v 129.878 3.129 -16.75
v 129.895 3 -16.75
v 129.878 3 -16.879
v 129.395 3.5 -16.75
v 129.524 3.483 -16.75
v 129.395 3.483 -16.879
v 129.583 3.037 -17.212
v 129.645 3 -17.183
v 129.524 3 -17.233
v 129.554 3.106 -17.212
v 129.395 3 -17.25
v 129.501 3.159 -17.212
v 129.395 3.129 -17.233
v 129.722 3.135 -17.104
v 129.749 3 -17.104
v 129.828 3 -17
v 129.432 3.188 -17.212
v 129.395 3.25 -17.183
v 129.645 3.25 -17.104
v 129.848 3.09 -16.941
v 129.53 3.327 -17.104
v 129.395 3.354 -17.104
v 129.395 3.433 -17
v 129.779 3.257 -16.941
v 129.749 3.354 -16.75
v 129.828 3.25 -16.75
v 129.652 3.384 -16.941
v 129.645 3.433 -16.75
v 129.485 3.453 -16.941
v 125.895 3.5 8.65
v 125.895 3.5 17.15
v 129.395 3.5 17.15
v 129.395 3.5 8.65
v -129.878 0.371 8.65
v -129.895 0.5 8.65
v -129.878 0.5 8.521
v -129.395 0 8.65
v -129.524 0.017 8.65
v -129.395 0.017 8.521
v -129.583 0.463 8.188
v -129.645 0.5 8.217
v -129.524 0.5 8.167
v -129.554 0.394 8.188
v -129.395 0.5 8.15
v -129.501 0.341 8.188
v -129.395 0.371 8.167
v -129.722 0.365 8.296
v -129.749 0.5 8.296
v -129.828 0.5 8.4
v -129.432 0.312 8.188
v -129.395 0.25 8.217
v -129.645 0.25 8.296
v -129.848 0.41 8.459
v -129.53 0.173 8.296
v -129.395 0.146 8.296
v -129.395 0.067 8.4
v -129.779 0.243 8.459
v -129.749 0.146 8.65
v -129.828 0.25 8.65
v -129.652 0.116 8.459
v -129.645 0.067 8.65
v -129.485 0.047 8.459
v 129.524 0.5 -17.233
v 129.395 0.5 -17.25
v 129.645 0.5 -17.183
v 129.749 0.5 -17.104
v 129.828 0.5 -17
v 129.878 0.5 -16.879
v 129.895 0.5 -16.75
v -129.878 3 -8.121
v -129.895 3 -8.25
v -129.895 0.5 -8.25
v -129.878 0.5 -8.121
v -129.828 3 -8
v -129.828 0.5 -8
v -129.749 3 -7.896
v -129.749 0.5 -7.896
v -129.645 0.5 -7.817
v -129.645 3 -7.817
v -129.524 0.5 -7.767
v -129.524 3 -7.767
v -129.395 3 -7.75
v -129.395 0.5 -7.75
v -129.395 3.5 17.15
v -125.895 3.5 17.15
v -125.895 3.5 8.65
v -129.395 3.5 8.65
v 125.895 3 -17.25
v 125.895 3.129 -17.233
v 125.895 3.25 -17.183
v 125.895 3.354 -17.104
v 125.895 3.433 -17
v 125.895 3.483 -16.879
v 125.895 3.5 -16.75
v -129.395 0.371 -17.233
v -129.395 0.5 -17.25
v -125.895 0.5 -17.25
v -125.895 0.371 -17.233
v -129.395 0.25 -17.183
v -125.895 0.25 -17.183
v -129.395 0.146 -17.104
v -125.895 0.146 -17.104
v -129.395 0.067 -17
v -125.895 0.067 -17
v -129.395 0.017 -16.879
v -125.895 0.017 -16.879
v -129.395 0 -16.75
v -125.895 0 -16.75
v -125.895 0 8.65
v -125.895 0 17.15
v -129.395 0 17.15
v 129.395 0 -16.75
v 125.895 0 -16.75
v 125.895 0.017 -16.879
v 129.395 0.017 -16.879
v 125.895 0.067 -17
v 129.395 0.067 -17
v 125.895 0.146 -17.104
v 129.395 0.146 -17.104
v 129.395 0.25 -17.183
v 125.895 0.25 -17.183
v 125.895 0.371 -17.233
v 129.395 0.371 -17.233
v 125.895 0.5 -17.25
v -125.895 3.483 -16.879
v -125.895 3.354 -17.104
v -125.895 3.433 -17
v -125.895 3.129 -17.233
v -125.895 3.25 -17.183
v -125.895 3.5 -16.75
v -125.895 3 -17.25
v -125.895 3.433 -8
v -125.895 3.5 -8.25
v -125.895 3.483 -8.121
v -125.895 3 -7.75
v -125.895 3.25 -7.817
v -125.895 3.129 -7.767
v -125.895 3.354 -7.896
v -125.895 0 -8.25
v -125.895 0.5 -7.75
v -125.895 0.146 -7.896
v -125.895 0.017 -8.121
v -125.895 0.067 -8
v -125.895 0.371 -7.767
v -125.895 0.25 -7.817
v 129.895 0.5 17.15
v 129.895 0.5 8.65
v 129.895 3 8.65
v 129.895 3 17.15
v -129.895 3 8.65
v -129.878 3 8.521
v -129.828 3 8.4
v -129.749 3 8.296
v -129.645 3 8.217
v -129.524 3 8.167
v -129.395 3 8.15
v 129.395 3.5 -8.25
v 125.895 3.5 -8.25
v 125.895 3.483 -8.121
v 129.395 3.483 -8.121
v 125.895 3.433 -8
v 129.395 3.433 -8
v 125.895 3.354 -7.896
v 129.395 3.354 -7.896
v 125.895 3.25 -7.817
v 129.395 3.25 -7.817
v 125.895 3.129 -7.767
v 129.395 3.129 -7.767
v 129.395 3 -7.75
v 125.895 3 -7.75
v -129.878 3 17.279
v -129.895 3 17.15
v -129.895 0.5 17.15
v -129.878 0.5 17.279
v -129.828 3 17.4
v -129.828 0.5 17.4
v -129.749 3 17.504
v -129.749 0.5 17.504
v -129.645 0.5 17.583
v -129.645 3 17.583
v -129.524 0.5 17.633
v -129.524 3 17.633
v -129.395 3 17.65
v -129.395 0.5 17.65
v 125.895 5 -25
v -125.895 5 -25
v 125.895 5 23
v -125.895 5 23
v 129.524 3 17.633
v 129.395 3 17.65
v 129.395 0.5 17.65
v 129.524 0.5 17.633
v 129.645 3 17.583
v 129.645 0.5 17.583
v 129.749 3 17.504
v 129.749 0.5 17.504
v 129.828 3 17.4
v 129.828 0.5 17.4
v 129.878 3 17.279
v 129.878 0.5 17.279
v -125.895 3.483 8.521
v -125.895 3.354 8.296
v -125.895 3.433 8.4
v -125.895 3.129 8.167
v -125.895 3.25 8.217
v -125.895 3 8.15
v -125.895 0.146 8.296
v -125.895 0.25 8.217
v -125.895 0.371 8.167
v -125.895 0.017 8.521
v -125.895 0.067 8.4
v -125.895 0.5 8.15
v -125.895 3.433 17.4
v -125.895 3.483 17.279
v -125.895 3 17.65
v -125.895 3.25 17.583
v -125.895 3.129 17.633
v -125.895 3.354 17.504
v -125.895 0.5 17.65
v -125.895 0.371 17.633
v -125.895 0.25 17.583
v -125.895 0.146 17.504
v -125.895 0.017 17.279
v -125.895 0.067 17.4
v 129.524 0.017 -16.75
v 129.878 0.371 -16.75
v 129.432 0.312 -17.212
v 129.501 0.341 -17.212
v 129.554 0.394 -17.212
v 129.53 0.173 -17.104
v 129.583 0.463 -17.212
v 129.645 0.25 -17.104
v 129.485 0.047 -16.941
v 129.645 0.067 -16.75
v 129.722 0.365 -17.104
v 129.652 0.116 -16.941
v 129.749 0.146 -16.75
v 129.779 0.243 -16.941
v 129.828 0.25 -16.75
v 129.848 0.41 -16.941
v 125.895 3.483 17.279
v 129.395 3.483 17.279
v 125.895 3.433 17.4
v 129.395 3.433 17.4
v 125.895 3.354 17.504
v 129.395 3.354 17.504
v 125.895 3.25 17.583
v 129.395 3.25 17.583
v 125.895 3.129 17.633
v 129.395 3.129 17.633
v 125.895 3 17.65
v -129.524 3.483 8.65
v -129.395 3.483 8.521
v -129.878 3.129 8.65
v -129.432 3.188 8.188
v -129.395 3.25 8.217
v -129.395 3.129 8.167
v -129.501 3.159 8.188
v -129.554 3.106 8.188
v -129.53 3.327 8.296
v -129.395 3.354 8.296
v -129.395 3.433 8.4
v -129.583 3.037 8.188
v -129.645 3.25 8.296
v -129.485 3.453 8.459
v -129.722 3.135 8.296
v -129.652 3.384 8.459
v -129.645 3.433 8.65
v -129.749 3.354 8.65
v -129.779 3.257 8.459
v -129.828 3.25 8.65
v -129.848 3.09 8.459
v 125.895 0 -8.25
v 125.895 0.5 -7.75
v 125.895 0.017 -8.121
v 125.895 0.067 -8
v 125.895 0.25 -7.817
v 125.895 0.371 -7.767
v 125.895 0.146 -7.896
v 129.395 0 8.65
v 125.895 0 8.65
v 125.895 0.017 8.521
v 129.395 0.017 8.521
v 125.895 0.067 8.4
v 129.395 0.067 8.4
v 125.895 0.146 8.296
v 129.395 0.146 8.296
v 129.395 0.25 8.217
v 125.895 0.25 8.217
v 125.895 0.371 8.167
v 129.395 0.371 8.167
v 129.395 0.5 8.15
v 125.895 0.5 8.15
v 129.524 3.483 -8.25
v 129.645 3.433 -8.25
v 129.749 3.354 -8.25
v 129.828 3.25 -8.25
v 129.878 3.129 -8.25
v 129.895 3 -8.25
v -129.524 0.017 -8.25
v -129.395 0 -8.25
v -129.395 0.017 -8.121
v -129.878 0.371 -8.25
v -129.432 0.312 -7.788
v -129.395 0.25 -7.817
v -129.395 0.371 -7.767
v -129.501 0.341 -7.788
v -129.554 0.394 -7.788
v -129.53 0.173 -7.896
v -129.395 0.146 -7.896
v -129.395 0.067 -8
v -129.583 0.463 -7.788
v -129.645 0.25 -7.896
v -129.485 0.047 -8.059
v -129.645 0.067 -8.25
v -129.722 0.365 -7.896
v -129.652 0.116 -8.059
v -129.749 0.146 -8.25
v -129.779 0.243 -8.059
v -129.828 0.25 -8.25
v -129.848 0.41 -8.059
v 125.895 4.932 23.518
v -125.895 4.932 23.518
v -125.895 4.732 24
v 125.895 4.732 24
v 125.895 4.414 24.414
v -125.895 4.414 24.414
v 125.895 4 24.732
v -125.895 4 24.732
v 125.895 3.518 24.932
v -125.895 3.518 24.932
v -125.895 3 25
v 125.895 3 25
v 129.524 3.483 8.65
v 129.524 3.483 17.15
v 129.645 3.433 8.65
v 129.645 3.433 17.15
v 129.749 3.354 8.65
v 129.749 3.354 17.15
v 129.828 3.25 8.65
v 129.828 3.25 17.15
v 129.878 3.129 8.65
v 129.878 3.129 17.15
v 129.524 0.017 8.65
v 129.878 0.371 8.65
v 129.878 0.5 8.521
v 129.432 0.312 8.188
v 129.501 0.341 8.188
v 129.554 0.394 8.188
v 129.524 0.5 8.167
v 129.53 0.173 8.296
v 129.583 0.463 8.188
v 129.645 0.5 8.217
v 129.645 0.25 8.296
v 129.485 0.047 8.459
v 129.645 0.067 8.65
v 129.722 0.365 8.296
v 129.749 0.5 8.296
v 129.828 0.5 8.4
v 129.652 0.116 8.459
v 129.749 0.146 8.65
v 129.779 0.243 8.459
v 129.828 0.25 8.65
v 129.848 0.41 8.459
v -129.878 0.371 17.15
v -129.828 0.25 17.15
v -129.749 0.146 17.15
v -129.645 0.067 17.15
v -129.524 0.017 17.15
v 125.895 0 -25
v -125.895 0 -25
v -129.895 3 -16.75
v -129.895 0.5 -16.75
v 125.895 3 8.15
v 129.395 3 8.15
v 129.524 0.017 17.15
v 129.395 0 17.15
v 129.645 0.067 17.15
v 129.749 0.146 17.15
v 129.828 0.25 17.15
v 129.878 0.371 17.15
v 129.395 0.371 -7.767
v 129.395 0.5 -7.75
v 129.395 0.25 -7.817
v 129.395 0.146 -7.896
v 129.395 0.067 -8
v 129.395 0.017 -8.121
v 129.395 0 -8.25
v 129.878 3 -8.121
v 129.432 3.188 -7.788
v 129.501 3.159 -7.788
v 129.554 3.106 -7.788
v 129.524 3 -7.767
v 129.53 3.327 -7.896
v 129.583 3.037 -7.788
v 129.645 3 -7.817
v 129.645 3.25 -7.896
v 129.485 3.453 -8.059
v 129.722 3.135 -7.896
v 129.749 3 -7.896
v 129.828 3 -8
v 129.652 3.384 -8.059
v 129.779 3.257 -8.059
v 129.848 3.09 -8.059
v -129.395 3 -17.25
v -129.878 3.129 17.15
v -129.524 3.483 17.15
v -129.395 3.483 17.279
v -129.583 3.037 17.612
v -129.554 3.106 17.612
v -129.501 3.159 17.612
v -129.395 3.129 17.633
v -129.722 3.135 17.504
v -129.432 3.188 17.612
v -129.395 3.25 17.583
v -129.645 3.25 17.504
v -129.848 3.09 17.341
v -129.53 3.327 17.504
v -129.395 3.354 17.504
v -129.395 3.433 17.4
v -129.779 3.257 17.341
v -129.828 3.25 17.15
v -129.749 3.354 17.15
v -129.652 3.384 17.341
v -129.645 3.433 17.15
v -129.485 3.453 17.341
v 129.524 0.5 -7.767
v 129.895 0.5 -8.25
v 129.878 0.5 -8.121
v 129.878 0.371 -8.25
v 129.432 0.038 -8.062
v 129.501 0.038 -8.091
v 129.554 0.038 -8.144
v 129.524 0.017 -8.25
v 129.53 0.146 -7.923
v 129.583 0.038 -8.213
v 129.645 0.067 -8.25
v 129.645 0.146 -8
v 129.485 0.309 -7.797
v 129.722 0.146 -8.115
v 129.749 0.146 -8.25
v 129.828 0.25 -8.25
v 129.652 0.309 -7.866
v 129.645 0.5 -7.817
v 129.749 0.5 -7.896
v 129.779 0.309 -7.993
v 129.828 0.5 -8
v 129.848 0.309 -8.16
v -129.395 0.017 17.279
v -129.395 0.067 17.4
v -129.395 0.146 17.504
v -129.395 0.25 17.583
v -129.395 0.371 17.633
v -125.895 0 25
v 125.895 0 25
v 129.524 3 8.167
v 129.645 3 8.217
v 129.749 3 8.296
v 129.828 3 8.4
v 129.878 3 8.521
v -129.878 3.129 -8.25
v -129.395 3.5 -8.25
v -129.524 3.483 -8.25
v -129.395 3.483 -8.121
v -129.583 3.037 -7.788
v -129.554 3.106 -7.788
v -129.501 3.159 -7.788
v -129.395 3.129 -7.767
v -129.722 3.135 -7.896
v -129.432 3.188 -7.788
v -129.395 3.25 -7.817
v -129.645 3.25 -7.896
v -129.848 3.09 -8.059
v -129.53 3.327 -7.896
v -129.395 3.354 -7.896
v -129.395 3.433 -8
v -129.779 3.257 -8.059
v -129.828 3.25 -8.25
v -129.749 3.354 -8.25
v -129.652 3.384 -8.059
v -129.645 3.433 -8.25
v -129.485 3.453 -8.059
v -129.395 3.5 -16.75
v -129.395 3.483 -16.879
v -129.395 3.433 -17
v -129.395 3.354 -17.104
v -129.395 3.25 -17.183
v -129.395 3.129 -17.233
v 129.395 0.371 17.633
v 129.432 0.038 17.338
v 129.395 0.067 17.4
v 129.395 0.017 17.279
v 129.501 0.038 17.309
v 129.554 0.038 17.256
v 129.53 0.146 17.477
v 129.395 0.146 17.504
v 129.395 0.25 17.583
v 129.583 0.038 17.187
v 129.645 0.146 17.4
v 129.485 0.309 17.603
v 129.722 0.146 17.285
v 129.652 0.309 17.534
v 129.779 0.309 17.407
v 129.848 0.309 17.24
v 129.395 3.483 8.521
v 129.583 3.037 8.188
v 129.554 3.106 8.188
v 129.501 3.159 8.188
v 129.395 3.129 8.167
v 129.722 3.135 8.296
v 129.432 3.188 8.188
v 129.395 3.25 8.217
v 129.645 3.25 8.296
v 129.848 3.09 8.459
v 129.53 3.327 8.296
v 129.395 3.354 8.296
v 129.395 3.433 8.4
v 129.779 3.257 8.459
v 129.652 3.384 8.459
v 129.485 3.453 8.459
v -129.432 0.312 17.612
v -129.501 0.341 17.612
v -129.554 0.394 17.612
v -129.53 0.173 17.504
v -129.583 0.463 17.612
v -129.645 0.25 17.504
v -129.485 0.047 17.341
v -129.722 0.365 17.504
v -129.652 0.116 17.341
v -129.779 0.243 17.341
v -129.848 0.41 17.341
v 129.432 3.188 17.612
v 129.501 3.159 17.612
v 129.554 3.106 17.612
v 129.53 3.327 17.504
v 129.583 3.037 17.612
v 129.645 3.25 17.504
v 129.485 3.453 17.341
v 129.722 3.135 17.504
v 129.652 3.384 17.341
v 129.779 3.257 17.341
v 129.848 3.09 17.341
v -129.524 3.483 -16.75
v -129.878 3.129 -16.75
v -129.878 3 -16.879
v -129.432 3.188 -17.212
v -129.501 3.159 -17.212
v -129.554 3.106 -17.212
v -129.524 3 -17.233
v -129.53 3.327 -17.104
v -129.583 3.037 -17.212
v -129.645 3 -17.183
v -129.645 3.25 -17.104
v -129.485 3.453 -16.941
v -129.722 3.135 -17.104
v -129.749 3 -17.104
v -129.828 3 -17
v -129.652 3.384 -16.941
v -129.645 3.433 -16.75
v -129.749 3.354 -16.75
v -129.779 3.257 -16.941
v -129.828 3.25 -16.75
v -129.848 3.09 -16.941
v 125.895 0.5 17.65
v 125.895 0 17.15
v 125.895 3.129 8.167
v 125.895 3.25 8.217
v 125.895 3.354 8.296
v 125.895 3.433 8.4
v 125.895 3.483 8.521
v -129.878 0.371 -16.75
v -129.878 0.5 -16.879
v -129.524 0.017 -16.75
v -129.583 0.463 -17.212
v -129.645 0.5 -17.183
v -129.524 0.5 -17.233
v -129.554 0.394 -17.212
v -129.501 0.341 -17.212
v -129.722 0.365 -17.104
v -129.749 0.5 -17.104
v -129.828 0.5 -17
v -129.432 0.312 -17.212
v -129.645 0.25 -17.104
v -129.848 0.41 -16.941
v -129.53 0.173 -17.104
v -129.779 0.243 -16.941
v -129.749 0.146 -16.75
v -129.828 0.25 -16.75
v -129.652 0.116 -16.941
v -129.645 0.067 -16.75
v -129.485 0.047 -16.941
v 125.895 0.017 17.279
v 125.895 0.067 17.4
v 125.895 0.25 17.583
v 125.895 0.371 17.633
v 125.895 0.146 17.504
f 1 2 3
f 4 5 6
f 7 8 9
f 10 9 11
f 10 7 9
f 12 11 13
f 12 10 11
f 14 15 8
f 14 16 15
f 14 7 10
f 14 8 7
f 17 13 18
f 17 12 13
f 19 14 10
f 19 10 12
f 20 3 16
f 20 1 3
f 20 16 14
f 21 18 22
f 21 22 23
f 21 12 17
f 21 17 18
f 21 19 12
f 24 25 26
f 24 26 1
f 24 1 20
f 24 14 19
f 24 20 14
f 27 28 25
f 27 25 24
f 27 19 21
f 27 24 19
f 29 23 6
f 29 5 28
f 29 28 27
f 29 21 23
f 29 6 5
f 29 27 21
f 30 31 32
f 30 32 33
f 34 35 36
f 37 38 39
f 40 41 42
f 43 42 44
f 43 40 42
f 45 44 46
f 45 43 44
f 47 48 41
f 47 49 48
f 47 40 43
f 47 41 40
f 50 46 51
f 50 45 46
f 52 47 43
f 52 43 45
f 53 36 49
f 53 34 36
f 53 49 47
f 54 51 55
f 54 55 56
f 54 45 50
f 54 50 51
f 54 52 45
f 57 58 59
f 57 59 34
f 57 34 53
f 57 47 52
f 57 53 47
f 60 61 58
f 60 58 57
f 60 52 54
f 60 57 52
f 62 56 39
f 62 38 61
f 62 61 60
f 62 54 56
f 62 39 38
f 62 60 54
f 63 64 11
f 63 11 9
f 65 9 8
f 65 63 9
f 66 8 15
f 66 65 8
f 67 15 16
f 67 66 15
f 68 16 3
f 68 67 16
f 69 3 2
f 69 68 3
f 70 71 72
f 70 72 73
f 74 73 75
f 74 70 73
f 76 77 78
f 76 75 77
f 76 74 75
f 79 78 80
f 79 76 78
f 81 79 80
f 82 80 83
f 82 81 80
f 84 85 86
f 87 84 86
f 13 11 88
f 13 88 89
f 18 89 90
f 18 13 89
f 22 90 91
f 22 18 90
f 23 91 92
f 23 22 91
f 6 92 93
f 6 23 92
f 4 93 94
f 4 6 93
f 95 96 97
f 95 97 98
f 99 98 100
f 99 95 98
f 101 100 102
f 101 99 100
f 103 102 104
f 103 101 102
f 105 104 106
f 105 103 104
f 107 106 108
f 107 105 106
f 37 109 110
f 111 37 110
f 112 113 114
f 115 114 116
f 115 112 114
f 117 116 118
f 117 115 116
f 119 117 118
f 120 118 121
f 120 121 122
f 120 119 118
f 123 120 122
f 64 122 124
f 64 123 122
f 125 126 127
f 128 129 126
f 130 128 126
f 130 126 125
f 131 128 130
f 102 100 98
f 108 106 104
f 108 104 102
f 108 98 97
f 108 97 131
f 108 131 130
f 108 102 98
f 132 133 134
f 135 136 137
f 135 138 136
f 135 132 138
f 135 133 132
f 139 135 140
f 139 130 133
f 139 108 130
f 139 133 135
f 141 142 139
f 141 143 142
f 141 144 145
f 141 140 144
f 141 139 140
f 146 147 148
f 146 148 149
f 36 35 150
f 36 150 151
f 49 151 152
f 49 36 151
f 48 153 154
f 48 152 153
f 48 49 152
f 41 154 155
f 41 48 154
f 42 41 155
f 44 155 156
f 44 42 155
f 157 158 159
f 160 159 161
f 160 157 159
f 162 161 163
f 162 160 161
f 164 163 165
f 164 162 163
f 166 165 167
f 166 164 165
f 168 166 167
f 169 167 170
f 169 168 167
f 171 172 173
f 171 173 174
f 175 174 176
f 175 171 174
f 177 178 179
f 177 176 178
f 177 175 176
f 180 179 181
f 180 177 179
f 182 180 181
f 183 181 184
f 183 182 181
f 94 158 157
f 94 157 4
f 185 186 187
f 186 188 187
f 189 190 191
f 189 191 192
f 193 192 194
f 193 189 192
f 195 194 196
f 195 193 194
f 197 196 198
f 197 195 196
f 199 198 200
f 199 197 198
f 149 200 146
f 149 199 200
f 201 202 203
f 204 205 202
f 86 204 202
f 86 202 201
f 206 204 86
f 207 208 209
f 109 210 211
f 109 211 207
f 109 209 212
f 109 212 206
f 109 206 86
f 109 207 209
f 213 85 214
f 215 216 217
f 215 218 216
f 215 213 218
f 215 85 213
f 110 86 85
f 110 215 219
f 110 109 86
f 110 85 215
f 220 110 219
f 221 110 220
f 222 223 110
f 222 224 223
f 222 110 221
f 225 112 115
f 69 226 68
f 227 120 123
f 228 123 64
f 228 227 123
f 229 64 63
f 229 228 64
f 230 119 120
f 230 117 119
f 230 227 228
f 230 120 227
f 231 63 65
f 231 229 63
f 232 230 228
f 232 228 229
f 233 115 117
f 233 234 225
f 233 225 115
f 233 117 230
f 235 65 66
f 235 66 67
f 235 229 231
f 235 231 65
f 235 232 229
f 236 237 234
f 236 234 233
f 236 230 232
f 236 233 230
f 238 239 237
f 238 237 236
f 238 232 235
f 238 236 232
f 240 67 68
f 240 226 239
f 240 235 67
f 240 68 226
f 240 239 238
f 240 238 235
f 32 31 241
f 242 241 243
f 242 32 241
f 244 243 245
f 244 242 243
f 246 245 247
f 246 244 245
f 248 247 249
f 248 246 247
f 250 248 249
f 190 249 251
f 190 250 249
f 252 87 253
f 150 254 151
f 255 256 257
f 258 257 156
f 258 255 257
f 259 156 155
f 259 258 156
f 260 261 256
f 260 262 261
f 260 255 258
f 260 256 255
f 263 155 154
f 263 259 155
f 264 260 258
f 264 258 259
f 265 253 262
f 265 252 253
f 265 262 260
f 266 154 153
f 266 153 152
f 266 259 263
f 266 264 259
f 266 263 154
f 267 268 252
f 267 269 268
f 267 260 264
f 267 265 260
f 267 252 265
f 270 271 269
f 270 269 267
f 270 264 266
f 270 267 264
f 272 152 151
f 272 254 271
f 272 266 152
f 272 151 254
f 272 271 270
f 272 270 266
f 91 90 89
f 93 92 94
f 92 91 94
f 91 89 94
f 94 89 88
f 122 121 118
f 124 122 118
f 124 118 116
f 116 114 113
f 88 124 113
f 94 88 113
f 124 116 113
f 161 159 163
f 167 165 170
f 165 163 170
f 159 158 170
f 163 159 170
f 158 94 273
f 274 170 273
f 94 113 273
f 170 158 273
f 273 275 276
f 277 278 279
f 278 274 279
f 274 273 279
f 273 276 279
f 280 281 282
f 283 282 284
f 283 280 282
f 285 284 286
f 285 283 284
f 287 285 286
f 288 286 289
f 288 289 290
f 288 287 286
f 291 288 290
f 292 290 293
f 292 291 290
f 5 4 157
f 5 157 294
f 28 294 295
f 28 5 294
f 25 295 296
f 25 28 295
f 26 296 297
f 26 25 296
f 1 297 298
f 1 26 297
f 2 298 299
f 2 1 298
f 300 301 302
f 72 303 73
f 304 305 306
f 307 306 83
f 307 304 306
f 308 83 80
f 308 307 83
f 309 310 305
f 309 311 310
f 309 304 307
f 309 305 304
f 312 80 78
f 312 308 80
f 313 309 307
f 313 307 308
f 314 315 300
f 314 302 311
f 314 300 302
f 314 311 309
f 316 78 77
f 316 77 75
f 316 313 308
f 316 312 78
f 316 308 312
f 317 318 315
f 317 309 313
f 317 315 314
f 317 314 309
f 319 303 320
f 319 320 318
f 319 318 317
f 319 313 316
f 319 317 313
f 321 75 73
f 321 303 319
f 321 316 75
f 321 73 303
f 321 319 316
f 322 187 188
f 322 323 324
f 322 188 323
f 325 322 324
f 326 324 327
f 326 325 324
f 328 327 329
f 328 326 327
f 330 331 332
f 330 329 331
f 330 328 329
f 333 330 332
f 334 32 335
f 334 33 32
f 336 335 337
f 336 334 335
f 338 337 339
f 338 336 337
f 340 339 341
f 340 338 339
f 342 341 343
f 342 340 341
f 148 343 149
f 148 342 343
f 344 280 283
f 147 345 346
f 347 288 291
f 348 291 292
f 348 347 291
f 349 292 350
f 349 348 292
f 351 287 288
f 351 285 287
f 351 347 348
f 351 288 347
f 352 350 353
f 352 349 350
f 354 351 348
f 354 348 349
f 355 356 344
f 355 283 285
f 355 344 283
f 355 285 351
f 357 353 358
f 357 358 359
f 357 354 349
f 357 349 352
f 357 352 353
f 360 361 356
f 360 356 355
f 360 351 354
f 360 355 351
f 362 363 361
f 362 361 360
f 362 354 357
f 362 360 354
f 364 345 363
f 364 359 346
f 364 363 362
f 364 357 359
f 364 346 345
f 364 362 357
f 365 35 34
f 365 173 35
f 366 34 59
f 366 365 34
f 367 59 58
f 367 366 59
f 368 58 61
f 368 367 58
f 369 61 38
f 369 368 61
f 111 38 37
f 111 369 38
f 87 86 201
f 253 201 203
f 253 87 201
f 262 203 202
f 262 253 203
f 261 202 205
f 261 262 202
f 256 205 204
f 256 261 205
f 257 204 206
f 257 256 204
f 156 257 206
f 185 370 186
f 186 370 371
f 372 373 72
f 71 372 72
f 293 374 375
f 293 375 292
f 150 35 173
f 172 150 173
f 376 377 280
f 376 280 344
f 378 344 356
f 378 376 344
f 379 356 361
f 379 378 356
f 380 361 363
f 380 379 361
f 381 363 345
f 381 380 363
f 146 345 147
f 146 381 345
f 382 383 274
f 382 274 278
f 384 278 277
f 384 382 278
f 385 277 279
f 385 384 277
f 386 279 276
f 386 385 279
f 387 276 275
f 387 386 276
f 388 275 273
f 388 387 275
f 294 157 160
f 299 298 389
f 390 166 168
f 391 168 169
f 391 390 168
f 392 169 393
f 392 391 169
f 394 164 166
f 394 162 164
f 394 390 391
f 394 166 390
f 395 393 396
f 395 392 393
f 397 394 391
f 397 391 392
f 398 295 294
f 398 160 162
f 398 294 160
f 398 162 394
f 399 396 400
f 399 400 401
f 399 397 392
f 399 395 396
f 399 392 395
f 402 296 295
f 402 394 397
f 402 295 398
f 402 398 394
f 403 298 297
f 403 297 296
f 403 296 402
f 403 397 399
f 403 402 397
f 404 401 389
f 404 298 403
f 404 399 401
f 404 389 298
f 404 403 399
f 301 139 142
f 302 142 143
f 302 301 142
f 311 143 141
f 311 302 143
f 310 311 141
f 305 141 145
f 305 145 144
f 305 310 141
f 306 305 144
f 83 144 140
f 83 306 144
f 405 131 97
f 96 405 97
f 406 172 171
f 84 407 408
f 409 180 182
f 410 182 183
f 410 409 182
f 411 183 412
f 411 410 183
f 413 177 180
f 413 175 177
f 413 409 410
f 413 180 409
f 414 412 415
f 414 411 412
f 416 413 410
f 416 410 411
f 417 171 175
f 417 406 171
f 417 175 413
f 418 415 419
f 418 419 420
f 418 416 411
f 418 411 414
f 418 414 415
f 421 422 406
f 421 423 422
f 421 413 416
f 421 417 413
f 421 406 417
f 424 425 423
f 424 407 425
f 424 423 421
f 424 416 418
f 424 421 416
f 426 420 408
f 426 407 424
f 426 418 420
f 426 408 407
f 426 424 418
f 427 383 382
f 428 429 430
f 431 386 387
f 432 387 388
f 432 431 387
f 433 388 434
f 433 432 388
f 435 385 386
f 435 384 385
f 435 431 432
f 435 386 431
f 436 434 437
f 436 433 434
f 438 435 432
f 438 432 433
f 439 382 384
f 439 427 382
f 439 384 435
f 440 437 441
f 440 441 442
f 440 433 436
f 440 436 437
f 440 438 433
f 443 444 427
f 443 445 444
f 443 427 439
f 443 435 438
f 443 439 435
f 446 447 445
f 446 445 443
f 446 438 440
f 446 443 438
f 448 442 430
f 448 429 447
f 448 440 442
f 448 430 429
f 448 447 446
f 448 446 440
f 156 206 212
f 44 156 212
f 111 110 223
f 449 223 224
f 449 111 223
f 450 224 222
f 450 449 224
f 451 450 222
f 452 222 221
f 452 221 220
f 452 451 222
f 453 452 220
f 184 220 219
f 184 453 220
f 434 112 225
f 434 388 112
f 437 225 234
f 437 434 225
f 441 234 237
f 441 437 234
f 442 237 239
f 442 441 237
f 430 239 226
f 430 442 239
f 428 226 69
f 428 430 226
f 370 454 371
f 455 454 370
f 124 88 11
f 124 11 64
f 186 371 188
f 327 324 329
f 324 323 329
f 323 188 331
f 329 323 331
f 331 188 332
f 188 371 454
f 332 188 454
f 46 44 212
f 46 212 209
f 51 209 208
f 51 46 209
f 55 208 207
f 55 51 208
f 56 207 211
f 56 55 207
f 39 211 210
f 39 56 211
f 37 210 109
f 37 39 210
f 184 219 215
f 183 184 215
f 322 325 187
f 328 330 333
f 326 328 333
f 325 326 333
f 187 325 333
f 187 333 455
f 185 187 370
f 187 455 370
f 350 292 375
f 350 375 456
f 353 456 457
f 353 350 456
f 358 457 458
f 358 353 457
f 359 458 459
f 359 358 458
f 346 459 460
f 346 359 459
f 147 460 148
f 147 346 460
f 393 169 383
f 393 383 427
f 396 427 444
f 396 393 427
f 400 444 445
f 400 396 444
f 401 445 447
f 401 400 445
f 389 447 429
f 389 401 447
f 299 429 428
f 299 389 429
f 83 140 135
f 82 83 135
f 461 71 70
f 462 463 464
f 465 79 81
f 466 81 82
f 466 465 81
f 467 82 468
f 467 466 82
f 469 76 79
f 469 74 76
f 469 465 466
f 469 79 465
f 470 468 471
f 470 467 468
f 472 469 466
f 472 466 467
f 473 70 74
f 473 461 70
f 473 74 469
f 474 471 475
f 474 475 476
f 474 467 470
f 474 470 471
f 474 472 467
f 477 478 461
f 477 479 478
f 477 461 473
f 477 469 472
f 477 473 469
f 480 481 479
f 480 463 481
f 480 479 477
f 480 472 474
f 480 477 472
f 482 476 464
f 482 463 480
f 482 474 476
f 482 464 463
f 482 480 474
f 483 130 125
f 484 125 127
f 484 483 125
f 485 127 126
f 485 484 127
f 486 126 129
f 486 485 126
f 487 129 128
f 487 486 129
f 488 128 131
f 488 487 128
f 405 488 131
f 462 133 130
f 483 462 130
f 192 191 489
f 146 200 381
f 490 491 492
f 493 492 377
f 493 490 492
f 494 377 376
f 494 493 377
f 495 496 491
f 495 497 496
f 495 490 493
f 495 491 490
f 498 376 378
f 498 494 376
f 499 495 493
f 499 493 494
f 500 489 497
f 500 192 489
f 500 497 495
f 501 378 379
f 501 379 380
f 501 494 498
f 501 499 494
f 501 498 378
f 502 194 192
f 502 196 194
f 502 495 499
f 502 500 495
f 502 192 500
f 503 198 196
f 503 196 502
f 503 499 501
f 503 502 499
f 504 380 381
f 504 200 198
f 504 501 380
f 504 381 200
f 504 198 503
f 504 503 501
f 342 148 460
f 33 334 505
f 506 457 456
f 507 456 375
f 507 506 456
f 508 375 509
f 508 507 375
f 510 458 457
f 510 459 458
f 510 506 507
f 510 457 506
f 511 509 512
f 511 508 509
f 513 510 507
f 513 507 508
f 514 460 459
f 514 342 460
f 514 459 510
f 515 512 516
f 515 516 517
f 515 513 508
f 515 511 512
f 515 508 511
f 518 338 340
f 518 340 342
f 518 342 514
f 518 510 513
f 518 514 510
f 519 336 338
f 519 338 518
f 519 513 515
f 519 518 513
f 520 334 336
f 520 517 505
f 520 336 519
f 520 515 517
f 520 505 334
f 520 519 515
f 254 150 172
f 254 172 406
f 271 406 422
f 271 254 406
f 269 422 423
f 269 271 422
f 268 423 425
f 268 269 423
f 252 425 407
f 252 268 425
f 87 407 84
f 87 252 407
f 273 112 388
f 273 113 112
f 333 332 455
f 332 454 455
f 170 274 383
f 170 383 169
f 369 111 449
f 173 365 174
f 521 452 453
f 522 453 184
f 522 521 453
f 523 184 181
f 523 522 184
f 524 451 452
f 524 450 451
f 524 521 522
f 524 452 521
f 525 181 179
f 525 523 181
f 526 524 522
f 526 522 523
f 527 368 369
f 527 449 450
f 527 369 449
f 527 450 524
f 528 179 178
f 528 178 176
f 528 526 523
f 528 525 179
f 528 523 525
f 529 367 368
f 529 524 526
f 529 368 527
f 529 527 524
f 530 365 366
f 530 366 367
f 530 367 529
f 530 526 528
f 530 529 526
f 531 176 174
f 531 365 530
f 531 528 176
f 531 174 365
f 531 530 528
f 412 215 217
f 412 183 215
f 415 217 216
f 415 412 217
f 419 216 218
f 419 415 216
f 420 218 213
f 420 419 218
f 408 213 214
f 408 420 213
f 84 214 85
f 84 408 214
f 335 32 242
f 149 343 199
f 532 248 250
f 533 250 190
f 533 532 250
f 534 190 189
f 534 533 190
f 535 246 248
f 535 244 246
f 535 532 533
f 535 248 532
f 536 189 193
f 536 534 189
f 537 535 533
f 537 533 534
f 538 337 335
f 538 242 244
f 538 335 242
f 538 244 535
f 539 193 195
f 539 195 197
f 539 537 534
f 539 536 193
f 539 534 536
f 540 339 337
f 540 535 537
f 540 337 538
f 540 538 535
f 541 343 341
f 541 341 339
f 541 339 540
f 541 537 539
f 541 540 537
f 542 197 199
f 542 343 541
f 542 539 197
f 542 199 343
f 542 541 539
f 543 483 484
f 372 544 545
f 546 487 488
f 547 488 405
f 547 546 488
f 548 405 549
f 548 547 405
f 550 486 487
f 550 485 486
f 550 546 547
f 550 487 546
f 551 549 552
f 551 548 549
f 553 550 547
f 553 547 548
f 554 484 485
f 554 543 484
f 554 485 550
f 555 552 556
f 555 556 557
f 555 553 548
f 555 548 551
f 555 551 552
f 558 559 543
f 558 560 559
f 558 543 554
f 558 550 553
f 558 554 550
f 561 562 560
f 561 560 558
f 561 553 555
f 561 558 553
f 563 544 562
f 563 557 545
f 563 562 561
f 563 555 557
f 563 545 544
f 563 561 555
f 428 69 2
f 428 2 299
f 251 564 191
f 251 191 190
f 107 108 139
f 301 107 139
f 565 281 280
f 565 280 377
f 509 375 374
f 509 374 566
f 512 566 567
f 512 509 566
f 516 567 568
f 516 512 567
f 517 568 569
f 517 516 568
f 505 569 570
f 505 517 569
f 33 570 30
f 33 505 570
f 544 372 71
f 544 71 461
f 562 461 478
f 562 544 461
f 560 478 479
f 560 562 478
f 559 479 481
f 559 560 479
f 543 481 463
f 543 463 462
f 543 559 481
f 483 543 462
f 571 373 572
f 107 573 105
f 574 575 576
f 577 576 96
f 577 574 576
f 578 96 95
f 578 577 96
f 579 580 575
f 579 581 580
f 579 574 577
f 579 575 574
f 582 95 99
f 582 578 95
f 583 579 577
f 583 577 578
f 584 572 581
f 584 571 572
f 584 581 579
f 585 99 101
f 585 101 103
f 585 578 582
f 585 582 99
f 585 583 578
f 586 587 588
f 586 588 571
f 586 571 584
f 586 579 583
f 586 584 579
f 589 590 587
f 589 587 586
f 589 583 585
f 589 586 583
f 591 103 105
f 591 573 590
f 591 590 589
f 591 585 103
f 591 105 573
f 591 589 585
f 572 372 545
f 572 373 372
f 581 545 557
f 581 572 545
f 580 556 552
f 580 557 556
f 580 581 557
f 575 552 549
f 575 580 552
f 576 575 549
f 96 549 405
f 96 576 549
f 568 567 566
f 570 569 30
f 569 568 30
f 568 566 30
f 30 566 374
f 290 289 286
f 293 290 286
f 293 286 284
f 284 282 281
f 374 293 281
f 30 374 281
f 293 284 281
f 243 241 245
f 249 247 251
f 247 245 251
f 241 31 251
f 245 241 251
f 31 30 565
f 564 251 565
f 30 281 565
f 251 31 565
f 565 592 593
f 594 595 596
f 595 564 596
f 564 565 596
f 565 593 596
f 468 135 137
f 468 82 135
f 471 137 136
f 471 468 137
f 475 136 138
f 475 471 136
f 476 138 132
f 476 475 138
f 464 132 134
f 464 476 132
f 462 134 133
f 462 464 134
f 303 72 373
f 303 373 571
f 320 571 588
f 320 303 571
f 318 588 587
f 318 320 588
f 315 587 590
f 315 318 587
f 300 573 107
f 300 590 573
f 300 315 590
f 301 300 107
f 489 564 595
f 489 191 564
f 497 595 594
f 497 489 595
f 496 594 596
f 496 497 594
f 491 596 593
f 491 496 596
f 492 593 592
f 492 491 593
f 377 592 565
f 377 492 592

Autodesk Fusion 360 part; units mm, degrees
sketch "Sketch1" plane through (0, 0, 0) normal (0, -1, 0) x (1, 0, 0) in component "DDD Wall Control Center Piece Parametric Template"
  line L0 (125.895, -25) -> (-125.895, -25)
  line L1 (-125.895, -25) -> (-125.895, 25)
  line L2 (-125.895, 25) -> (125.895, 25)
  line L3 (125.895, 25) -> (125.895, -25)
  line L4 (125.895, -25) -> (-125.895, 25) construction
  line L5 (-125.895, -25) -> (125.895, 25) construction
  dimension "d1" = 251.79
  dimension "d2" = 50
extrude "Extrude1" add sketch "Sketch1" against normal blind 5 makes body 1 in component "DDD Wall Control Center Piece Parametric Template"
fillet "Fillet3" radius 2 1 edges at (0, 5, 25) on bodies 1 in component "DDD Wall Control Center Piece Parametric Template"
sketch "Sketch3" plane through (0, 0, 0) normal (1, 0, 0) x (0, 0, 1) in component "DDD Wall Control Center Piece Parametric Template"
  line L0 (-17.25, 0) -> (-7.75, 0)
  line L1 (-7.75, 0) -> (-7.75, -3.5)
  line L2 (-7.75, -3.5) -> (-17.25, -3.5)
  line L3 (-17.25, -3.5) -> (-17.25, 0)
  line L4 (-17.25, 0) -> (-7.75, -3.5) construction
  line L5 (-7.75, 0) -> (-17.25, -3.5) construction
  line L6 (1.75, 0) -> (22.5, 0)
  point P0 (-12.5, -1.75)
  dimension "d165" = 9.5
  dimension "d166" = 3.5
  dimension "d167" = 7.75
extrude "Extrude3" add sketch "Sketch3" along normal blind 4 from surface at 125.895 separate body makes body 2 in component "DDD Wall Control Center Piece Parametric Template"
extrude "Extrude6" add sketch "Sketch3" against normal blind 4 from surface at -125.895 separate body makes body 3 in component "DDD Wall Control Center Piece Parametric Template"
fillet "Fillet4" radius 0.5 16 edges at (129.895, 3.5, -12.5) (129.895, 1.75, -7.75) (127.895, 3.5, -7.75) (127.895, 0, -7.75) (129.895, 0, -12.5) (127.895, 3.5, -17.25) (127.895, 0, -17.25) (129.895, 1.75, -17.25) (-129.895, 3.5, -12.5) (-129.895, 0, -12.5) (-129.895, 1.75, -7.75) (-127.895, 0, -7.75) (-127.895, 3.5, -7.75) (-127.895, 3.5, -17.25) (-127.895, 0, -17.25) (-129.895, 1.75, -17.25) on bodies 2 3 in component "DDD Wall Control Center Piece Parametric Template"
pattern_linear "R-Pattern4" count 2 spacing 25.4 along (0, 0, 1) of bodies 2 3 makes body 4 at (125.895, 1.1667, 11.4833) makes body 5 at (-125.895, 2.3333, 11.4833) in component "DDD Wall Control Center Piece Parametric Template"
component "DDD Wall Control Center Piece Parametric Template" placed x (1, 0, 0) y (0, 1, 0) z (0, 0, 1) at (0, 0, 0)
equation "d1 = CenterPieceWidthMM"
equation "d2 = CenterPieceDepth"
equation "d3 = -CenterPieceThickness"
equation "CenterPieceWidthUnits = 10" comment "Number of spaces on the wall control pegboard.  Minimum 1,  maximum 14 for vertical wall control panels and 31 for horizonal panels.  Realistically your printer dimensions will determin how big you can make this."
equation "CenterPieceWidthMM = ( CenterPieceWidthUnits * 25.4 mm ) - 2.21 mm" comment "Don't change this.  Change CenterPieceWidthUnits instead.  Final width dimension subtracts 2.21mm from the standard 1\" space between wall control slots to account for the tabs for mouting into the slots"
equation "CenterPieceDepth = 50 mm" comment "Depth measurement from the wall control board extending out into space.  Minimum 17mm to fit at least one mounting tab.  Maximum  ¯\\_(ツ)_/¯"
equation "CenterPieceThickness = 5 mm" comment "Lower measurements make for good shelf-like objects,  taller measurement make for better custom tool holders.  Minimum 5mm to ensure there's enough space for mounting tabs. Maximum  ¯\\_(ツ)_/¯"
equation "CountMountingTabs = 2" comment "Specify the number of mounting tabs to attach a sidepiece"
equation "HowToUse = 0" comment "Save this as a new design seperate from the original to preserve the template.  Then modify as needed for centerpiece divider racks."
equation "d167 = CenterPieceDepth / 2 - 17.25 mm"
equation "d168 = CountMountingTabs"
